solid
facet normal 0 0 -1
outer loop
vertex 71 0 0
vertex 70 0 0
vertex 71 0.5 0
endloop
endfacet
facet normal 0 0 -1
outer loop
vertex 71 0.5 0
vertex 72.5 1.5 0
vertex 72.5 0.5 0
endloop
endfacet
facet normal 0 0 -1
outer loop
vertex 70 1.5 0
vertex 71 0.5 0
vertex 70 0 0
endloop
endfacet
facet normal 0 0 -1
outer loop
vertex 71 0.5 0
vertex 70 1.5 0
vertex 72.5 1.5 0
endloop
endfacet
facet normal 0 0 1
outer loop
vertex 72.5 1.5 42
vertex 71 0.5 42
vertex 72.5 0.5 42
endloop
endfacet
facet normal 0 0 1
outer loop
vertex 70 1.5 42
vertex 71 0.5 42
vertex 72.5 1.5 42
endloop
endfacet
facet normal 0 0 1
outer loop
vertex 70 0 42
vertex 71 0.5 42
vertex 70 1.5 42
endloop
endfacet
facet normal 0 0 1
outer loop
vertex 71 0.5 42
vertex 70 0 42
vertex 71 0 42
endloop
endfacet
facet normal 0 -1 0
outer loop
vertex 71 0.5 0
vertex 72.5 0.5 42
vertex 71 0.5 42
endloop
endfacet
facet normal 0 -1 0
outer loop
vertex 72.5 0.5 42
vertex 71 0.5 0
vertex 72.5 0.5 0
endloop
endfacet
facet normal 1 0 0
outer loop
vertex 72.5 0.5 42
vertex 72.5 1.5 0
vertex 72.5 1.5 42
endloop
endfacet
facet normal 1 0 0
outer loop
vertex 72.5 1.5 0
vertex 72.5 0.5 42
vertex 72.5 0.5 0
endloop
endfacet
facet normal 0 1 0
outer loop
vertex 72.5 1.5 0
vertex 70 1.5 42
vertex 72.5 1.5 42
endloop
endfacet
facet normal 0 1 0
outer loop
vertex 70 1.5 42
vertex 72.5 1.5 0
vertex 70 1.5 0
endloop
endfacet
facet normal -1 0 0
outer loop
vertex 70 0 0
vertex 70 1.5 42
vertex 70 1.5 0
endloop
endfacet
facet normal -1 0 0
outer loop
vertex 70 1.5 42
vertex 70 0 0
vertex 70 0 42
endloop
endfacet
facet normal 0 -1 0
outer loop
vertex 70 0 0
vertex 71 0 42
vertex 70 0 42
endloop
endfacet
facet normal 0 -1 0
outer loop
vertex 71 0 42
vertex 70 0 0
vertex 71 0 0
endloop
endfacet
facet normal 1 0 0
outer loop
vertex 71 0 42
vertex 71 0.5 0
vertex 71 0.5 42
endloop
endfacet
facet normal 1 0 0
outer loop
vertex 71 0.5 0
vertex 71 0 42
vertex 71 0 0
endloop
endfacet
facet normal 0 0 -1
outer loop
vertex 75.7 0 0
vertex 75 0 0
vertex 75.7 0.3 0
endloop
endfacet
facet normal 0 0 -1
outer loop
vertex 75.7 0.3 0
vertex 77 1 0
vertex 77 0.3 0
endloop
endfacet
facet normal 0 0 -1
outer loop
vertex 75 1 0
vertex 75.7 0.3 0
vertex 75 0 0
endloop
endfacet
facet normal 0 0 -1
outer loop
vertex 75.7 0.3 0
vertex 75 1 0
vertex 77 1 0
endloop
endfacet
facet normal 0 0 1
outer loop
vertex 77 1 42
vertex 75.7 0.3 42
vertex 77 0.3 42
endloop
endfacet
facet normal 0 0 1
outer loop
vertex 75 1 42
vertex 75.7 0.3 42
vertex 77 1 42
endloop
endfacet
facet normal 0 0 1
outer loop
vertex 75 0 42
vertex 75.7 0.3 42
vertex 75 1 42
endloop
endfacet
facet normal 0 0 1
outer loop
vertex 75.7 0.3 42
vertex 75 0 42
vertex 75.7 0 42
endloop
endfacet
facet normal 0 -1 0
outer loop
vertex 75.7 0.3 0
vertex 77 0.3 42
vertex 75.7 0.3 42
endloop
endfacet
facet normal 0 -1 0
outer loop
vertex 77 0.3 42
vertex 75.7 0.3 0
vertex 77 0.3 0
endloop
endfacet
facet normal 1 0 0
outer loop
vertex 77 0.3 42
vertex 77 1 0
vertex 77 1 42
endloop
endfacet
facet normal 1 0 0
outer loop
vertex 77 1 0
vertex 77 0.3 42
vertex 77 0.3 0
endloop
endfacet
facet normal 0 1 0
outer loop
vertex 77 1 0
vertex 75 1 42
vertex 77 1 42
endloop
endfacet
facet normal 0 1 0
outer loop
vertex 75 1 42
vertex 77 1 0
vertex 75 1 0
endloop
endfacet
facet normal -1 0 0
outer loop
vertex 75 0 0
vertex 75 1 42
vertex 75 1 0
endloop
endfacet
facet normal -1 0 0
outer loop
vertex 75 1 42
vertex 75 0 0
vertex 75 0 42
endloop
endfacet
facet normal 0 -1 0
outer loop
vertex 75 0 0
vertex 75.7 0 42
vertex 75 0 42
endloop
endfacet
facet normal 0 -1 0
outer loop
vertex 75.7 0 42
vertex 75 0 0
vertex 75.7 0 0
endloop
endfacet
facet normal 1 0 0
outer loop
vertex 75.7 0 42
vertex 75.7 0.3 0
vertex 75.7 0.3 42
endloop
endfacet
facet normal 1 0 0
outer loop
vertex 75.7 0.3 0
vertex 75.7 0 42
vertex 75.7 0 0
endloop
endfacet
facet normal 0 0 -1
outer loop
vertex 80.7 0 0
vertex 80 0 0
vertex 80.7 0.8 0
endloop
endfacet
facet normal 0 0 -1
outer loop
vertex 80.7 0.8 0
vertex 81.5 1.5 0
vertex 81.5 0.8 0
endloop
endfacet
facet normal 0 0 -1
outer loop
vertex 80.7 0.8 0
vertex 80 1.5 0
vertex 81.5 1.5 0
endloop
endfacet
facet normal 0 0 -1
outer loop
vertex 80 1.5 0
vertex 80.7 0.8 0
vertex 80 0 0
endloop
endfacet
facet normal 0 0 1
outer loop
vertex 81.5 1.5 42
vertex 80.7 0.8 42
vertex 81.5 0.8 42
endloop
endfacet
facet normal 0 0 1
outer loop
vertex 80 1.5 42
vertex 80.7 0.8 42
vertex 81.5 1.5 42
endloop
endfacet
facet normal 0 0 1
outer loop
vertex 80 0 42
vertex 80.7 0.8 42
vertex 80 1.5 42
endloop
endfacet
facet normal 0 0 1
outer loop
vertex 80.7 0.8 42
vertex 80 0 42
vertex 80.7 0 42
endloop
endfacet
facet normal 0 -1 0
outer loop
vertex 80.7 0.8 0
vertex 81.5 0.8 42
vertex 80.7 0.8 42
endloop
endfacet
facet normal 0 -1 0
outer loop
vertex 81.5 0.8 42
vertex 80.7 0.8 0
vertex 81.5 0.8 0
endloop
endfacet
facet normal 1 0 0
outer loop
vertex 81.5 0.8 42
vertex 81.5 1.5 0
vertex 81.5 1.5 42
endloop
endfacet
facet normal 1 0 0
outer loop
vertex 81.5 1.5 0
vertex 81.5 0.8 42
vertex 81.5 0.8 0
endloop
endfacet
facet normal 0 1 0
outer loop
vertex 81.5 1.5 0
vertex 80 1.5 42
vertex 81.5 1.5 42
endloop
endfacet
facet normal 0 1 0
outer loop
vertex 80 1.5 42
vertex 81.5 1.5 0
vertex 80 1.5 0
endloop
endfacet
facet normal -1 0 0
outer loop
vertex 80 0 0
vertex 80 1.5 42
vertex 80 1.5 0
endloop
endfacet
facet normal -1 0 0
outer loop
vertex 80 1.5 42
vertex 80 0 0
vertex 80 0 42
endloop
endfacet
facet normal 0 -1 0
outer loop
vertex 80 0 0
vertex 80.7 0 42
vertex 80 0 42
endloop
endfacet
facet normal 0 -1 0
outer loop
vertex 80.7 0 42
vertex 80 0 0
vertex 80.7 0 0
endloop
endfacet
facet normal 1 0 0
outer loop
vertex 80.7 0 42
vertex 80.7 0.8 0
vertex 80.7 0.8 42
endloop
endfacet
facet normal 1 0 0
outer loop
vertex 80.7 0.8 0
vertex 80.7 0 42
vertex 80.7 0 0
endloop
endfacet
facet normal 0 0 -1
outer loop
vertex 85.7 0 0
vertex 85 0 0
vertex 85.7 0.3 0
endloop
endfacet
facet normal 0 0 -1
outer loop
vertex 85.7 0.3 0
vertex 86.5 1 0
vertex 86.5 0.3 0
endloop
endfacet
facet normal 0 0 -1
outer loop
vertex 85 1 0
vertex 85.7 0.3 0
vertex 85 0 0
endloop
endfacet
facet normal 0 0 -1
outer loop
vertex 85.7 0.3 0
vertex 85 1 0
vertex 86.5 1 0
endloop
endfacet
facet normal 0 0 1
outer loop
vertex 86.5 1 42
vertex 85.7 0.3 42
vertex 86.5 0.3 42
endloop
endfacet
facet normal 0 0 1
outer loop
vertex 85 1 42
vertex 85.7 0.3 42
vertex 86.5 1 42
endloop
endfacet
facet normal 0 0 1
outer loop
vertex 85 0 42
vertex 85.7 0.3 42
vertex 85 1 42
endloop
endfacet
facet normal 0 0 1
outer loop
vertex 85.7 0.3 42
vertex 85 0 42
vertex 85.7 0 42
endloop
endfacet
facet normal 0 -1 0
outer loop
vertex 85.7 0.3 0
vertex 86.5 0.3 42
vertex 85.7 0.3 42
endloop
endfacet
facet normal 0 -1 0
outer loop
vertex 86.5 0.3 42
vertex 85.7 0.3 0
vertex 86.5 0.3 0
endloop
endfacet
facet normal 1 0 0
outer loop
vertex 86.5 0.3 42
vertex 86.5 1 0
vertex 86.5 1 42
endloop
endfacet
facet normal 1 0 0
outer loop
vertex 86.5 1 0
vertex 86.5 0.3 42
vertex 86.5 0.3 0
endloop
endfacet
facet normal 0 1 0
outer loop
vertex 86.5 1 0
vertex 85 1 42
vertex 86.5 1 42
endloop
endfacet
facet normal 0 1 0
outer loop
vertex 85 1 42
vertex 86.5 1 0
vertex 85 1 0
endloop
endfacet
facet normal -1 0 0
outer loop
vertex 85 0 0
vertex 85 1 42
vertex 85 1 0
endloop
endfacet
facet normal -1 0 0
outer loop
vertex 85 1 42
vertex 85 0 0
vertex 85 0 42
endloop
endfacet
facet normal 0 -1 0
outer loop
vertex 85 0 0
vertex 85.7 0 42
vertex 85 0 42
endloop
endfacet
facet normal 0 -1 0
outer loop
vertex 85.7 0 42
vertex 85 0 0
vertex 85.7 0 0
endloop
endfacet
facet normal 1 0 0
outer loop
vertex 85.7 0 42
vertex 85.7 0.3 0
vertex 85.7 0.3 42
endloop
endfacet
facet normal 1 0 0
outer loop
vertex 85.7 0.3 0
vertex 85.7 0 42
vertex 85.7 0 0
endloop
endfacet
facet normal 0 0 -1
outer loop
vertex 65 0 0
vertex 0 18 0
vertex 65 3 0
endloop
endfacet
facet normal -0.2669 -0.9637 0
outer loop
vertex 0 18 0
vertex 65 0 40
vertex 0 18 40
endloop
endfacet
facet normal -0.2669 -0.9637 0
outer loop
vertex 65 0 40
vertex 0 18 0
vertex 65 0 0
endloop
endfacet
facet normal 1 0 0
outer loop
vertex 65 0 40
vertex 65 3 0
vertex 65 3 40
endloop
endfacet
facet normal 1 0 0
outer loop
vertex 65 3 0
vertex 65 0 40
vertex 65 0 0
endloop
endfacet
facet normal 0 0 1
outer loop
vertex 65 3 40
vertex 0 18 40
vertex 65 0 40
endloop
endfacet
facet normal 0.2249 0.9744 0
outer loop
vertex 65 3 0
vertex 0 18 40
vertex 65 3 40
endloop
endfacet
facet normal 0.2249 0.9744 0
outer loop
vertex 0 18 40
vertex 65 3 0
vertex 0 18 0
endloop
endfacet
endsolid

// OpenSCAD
// created by IndiePandaaaaa | Lukas

ramp_depth = 40;
ramp_height_material_thickness = 3;
ramp_height_difference = 15;
ramp_width = 65;

lprofile_length = 42;
lprofile_height = 1.5;
lprofile_width = 2.5;
lprofile_thickness = 1;

module LProfile(length, width, height, thickness) {
    linear_extrude(length) {
        polygon([
                [0, 0],
                [thickness, 0],
                [thickness, height - thickness],
                [width, height - thickness],
                [width, height],
                [0, height],
            ]);
    }

}

// ramp adapter
linear_extrude(ramp_depth) {
    polygon([
            [0, ramp_height_difference + ramp_height_material_thickness],
            [ramp_width, ramp_height_material_thickness],
            [ramp_width, 0],
        ]);
}

translate([ramp_width + 5, 0, 0]) {
    LProfile(lprofile_length, lprofile_width, lprofile_height, lprofile_thickness);
    translate([5, 0, 0]) LProfile(lprofile_length, 2, 1, 0.7);
    translate([10, 0, 0]) LProfile(lprofile_length, 1.5, 1.5, 0.7);
    translate([15, 0, 0]) LProfile(lprofile_length, 1.5, 1, 0.7);
}
